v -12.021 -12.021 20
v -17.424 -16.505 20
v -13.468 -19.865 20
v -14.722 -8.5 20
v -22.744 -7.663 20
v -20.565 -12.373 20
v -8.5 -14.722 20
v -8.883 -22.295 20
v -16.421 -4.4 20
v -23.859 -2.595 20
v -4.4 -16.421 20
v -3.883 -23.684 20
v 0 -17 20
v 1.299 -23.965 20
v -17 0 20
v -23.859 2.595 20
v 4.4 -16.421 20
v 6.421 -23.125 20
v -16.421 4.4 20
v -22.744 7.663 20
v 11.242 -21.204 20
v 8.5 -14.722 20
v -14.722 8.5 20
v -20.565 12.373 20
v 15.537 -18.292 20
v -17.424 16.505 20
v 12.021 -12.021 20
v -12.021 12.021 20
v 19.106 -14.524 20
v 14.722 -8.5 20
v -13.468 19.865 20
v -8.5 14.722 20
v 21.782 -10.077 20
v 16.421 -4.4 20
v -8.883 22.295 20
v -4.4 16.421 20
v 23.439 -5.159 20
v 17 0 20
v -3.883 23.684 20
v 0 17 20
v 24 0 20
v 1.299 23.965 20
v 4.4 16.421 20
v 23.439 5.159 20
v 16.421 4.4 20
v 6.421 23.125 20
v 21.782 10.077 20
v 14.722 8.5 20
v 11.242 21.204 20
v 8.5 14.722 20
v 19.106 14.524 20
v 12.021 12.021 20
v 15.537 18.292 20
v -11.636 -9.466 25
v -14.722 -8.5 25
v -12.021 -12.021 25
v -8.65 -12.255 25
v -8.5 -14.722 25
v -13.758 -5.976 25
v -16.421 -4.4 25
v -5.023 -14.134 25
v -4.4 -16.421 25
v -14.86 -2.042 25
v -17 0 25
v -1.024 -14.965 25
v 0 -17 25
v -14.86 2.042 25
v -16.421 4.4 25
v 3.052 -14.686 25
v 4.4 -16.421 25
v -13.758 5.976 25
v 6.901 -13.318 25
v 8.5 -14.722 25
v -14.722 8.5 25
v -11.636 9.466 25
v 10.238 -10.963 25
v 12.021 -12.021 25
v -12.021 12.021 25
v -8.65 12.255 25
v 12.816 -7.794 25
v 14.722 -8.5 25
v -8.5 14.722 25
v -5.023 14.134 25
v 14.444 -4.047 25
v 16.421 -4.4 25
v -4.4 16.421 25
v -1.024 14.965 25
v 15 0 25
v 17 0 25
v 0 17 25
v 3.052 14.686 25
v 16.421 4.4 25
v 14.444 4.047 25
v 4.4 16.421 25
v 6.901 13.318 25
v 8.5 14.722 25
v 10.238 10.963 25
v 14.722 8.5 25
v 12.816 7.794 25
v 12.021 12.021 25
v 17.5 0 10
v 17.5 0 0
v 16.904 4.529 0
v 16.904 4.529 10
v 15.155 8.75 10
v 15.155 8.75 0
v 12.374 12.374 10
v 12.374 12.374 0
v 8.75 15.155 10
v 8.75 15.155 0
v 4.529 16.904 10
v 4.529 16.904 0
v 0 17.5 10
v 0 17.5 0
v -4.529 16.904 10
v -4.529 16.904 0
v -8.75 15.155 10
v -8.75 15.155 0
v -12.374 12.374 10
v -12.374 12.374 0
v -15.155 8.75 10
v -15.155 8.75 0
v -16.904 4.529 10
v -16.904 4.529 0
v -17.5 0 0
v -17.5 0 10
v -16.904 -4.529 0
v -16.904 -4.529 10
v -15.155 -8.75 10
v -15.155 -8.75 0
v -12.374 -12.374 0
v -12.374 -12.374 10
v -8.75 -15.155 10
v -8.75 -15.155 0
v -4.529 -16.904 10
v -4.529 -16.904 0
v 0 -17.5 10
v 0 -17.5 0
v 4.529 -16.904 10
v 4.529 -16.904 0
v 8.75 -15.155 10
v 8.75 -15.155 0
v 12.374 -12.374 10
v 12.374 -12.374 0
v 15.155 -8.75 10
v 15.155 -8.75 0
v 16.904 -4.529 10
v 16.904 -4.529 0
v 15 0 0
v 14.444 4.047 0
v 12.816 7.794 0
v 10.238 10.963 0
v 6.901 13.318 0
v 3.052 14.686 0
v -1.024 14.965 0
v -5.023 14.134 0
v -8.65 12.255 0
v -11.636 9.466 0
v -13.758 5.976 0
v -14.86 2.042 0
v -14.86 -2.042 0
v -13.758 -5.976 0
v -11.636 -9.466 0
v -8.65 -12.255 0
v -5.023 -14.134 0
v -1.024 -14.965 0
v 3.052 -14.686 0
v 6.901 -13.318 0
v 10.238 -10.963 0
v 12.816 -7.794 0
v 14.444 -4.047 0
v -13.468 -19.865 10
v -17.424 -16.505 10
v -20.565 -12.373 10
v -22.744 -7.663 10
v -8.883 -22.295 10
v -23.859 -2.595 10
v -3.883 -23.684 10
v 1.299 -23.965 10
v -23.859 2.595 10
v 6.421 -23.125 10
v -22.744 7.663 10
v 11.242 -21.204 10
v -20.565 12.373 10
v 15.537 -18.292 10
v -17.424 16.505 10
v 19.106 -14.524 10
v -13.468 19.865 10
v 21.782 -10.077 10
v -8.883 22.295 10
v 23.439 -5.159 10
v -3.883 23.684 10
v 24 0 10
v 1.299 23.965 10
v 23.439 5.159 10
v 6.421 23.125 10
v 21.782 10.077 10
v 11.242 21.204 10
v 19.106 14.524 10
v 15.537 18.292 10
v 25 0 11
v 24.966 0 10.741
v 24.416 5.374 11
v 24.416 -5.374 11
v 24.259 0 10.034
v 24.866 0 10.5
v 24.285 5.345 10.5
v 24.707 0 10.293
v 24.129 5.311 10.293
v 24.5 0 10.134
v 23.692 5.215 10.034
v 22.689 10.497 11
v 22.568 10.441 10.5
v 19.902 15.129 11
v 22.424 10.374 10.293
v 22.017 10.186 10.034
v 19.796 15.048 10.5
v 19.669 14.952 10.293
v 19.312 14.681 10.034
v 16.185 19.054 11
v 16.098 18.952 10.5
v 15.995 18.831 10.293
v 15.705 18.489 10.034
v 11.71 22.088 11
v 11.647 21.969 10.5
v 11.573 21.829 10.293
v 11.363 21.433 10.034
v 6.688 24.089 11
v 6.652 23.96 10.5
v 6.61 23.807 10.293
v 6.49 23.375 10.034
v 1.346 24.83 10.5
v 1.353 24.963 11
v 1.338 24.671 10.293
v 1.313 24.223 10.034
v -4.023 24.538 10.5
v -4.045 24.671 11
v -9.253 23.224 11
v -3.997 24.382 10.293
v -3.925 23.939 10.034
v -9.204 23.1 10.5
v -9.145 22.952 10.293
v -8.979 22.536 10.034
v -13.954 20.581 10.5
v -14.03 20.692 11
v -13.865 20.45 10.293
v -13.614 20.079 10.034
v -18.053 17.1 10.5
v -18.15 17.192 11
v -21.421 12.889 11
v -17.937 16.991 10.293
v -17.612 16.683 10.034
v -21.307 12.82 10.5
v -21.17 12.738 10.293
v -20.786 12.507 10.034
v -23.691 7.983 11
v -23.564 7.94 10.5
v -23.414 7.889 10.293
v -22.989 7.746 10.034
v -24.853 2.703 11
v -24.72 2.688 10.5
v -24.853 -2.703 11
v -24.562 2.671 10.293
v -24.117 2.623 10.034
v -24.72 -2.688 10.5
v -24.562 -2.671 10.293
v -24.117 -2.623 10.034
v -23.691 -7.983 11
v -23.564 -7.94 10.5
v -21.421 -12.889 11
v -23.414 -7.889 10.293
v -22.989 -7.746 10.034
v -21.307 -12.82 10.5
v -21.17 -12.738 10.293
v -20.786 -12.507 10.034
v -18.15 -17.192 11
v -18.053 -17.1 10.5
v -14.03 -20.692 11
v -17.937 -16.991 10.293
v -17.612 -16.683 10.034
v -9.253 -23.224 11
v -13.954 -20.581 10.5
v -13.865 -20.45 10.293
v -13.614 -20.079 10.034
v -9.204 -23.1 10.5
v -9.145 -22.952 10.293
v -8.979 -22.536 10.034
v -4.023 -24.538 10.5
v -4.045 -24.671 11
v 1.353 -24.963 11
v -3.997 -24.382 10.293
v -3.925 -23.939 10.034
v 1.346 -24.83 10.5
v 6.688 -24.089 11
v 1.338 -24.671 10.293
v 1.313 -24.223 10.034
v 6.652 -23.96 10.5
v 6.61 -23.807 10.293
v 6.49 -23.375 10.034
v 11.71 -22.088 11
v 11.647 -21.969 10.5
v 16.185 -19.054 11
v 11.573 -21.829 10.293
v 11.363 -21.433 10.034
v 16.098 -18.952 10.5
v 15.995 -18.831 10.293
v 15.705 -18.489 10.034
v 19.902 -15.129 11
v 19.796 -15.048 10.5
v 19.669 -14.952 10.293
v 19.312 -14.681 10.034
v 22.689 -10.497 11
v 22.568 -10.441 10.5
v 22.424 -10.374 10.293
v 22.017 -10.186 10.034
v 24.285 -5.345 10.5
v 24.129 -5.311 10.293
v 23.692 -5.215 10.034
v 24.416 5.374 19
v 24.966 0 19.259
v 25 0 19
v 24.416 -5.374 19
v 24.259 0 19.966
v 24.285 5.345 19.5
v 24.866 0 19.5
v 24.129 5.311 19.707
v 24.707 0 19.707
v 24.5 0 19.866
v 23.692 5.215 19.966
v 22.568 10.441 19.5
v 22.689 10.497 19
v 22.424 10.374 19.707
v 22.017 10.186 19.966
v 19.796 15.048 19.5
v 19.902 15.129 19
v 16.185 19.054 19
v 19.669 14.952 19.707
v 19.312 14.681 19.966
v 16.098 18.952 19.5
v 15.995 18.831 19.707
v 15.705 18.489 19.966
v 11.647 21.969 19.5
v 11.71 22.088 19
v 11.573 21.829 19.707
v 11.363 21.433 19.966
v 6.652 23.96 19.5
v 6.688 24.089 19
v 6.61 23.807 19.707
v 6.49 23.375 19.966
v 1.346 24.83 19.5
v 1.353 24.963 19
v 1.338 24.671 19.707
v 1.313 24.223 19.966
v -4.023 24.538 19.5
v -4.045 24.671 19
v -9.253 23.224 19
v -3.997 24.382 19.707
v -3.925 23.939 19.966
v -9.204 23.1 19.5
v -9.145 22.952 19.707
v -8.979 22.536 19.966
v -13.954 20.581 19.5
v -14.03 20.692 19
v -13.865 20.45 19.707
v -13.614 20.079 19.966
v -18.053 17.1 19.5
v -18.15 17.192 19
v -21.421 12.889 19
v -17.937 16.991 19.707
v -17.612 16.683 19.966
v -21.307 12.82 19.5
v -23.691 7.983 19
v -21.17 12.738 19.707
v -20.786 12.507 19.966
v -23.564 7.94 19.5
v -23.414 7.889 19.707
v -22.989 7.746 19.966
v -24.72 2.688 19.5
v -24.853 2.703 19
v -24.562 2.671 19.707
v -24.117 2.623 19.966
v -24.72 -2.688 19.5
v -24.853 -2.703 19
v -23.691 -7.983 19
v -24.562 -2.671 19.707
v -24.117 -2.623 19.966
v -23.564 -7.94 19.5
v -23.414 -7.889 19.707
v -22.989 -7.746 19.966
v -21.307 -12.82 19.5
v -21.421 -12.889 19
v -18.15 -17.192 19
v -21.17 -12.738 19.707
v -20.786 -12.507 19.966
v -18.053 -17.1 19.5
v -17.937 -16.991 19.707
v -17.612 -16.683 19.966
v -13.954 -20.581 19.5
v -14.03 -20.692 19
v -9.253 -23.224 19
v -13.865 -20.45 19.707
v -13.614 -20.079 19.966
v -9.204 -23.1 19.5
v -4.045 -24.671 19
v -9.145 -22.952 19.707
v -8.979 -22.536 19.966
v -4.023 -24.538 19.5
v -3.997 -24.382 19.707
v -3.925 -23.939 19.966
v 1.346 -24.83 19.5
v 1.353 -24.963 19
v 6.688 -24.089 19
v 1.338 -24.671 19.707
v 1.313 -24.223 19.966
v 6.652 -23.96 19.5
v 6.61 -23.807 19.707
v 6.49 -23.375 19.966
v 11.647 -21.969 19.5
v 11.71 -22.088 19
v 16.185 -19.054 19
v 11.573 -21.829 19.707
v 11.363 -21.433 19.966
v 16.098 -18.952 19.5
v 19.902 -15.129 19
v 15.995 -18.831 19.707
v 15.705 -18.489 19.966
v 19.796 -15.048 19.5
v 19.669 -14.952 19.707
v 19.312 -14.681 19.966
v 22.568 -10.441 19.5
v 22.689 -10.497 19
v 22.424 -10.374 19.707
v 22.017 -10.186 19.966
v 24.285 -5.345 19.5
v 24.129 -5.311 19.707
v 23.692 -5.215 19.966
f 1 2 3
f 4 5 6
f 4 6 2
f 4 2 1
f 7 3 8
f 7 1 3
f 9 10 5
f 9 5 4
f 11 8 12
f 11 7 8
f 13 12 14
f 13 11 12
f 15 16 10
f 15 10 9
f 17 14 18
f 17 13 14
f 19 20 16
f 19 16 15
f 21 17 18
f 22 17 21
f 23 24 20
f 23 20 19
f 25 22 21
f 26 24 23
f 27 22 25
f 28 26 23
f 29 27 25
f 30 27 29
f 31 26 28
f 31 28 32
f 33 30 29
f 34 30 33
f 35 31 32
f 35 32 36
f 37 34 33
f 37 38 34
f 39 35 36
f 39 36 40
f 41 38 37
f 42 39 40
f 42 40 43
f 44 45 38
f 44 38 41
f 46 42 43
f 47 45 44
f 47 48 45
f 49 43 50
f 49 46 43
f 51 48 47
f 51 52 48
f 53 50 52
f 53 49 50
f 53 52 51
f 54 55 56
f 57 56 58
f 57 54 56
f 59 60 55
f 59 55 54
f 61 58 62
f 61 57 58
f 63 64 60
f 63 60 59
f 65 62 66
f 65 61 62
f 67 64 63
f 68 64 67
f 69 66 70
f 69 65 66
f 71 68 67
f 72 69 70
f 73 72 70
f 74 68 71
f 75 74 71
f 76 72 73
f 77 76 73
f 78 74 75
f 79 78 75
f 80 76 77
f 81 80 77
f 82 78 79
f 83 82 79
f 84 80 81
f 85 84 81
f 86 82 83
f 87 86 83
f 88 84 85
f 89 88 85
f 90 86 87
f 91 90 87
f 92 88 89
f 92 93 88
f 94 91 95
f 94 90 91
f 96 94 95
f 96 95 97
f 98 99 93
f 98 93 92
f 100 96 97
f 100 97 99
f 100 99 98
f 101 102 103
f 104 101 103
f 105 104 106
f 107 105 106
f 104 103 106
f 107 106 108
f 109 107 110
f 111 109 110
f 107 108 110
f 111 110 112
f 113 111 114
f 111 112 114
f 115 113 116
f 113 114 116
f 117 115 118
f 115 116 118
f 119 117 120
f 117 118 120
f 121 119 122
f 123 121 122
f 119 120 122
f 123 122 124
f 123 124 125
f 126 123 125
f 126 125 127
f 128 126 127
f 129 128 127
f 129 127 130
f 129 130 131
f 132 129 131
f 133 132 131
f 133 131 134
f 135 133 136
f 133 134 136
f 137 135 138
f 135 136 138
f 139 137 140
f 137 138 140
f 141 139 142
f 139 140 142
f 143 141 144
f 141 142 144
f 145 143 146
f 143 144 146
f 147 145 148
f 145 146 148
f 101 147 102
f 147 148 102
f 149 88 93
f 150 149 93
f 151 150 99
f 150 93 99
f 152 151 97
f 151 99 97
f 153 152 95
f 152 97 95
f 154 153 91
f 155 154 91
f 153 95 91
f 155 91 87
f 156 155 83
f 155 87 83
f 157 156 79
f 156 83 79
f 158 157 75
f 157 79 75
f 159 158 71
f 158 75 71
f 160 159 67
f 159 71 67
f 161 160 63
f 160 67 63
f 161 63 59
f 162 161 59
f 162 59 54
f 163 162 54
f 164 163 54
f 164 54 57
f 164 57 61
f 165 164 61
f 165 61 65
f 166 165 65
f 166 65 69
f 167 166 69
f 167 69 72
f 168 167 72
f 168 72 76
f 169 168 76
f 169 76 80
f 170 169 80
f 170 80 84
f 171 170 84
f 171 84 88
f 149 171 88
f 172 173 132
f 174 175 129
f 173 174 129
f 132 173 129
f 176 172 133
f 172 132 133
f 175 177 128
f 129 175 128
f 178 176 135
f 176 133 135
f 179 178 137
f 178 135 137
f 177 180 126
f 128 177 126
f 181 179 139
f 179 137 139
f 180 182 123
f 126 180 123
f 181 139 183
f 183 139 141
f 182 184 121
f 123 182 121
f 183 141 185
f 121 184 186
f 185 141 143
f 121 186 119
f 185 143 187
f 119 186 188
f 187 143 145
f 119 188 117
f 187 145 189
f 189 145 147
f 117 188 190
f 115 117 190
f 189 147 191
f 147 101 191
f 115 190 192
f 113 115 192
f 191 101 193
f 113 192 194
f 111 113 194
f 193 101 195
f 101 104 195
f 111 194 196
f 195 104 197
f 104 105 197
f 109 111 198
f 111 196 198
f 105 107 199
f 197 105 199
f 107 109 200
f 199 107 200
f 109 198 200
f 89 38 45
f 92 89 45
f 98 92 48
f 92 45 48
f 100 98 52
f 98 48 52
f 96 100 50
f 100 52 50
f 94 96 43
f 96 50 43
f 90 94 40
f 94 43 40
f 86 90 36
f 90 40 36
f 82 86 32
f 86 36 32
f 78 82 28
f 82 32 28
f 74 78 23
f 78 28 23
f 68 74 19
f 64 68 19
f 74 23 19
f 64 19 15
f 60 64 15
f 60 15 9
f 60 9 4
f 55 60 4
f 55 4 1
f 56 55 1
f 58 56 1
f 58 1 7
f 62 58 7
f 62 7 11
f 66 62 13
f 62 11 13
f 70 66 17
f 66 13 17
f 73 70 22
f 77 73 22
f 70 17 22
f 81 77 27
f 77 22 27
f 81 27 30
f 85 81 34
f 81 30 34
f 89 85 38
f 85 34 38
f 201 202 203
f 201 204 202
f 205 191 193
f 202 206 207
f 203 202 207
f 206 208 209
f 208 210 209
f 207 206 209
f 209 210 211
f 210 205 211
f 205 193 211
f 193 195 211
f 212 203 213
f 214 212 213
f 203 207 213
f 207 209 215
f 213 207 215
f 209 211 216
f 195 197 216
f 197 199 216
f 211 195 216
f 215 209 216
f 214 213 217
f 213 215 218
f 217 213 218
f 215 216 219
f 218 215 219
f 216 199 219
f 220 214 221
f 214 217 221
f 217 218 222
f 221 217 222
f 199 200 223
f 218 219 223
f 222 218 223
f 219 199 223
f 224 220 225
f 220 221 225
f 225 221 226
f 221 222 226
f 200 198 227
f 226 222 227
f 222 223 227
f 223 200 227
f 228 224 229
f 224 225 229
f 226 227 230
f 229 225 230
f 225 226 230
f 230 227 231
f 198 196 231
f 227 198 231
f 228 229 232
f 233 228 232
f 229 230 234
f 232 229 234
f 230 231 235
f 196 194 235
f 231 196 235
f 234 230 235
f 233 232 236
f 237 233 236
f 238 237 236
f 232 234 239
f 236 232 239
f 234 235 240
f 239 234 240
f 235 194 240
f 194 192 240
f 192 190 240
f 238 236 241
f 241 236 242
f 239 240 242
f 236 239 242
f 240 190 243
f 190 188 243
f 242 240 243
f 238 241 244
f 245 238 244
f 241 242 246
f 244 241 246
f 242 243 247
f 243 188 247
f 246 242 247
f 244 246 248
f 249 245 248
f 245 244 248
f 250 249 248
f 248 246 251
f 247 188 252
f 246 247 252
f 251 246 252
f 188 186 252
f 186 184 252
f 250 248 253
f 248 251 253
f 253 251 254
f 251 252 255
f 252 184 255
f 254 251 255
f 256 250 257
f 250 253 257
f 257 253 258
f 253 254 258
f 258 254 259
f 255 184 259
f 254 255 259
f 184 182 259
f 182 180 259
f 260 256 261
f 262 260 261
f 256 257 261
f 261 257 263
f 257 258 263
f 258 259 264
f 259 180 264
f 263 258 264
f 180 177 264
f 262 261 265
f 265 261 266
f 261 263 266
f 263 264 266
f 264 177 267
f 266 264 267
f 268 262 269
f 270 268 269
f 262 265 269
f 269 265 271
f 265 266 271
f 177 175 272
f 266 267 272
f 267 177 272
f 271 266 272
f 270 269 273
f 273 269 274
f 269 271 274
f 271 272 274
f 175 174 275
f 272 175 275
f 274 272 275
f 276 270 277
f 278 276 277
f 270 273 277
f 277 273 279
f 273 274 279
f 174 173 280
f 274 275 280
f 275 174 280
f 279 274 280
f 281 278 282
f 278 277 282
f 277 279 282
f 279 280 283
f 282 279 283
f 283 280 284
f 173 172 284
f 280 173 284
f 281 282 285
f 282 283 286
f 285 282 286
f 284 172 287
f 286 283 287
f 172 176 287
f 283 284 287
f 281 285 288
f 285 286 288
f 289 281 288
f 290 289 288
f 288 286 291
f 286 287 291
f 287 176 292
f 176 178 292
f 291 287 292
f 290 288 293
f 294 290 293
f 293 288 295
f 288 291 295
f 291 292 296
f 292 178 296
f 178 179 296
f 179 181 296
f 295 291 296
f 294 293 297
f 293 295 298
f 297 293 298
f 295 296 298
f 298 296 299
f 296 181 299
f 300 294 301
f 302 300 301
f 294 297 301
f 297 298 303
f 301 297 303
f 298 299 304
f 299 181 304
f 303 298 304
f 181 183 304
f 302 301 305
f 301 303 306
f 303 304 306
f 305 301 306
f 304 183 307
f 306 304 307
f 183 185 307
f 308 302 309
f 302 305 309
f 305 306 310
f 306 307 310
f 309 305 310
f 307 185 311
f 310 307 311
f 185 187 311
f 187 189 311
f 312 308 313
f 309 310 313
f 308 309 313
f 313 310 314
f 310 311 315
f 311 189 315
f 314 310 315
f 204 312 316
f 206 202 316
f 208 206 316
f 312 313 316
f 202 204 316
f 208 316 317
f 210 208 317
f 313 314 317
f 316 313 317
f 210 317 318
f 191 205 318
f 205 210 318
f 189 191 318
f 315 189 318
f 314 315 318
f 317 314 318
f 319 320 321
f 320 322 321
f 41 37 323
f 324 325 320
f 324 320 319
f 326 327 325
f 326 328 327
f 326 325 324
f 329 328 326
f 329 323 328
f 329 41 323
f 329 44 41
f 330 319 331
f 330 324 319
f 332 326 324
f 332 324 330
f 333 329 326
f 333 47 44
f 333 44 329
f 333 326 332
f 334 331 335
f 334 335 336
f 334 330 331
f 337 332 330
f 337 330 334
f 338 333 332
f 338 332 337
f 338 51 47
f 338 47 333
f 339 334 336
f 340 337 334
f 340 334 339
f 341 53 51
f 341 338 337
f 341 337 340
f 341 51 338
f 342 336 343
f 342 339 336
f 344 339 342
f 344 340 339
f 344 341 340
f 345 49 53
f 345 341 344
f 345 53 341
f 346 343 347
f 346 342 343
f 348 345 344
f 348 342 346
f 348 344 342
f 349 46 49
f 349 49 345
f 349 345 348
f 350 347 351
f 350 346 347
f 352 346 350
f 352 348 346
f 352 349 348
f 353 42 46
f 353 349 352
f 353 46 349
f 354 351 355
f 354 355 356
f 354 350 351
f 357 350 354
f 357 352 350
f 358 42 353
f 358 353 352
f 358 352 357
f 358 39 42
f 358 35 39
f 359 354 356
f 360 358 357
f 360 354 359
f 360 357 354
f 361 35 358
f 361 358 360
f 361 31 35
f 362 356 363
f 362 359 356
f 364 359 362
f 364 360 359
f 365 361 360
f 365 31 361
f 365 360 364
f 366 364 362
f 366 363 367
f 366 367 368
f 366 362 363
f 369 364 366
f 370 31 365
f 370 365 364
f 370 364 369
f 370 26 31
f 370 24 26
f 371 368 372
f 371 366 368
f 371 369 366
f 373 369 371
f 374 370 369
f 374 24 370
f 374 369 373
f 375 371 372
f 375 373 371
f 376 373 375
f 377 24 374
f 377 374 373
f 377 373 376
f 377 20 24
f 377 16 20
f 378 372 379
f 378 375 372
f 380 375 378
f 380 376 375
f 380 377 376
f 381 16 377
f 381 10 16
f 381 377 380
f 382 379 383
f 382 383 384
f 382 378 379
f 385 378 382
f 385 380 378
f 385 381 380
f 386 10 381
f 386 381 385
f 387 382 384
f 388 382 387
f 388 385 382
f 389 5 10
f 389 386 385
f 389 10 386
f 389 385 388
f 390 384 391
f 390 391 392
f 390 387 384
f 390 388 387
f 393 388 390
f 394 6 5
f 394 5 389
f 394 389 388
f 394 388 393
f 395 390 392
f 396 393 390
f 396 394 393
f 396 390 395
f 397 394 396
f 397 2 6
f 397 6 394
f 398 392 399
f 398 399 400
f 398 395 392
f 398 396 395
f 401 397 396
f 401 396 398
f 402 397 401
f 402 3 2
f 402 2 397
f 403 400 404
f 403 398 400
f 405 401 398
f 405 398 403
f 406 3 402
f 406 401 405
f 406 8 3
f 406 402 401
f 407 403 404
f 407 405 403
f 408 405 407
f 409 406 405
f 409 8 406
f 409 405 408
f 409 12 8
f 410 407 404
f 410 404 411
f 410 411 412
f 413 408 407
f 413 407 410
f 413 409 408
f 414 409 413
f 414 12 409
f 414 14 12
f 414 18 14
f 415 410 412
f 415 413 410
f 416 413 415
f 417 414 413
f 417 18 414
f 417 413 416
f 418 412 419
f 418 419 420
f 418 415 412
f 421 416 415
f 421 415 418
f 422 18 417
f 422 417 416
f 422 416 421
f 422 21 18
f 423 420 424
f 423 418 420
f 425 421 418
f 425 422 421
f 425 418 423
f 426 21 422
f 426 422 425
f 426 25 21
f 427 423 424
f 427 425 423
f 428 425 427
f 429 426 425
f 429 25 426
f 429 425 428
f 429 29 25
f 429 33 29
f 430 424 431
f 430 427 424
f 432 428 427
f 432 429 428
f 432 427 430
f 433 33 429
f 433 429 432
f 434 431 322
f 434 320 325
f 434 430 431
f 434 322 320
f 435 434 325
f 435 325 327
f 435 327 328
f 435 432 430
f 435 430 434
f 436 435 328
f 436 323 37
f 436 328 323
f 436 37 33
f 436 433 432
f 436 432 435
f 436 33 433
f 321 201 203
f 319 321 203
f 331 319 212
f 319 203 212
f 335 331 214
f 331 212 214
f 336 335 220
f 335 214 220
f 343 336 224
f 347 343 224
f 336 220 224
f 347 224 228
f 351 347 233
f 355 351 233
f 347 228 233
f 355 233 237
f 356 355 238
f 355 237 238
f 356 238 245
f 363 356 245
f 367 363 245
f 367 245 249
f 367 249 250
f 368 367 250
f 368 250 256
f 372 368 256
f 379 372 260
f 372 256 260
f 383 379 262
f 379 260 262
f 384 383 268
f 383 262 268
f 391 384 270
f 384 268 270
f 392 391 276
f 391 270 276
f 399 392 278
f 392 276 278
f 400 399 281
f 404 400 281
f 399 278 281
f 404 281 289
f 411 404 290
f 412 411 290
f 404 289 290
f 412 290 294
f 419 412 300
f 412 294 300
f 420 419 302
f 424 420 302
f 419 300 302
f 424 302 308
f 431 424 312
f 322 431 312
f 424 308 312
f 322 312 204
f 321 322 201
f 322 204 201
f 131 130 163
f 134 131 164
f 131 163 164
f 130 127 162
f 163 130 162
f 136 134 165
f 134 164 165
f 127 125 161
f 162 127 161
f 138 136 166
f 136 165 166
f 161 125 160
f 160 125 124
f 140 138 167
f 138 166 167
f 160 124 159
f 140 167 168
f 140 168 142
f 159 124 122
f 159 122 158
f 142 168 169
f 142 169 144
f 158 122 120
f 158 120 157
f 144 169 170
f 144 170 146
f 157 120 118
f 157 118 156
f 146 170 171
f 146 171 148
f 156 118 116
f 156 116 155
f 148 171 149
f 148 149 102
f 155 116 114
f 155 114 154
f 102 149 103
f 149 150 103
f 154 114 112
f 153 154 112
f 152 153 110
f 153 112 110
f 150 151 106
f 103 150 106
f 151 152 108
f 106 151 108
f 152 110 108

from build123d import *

# Parameters (mm, degrees)
SKETCH1_R               = 17.5
BOSS_EXTRUDE1_DEPTH     = 10
SKETCH2_R               = 25
BOSS_EXTRUDE2_DEPTH     = 10
SKETCH3_R               = 17
BOSS_EXTRUDE3_DEPTH     = 5
SKETCH4_R               = 15
CUT_EXTRUDE1_DEPTH      = 1
CUT_EXTRUDE1_DEPTH_BACK = 26
FILLET1_R               = 1


with BuildPart() as part:
    # Sketch1 → Boss-Extrude1 (new body)
    with BuildSketch(Plane.XY):
        Circle(SKETCH1_R)
    extrude(amount=BOSS_EXTRUDE1_DEPTH)

    # Sketch2 → Boss-Extrude2 (add)
    with BuildSketch(Plane.XY.offset(10)):
        Circle(SKETCH2_R)
    extrude(amount=BOSS_EXTRUDE2_DEPTH)

    # Sketch3 → Boss-Extrude3 (add)
    with BuildSketch(Plane.XY.offset(20)):
        Circle(SKETCH3_R)
    extrude(amount=BOSS_EXTRUDE3_DEPTH)

    # Sketch4 → Cut-Extrude1 (cut, two sides)
    with BuildSketch(Plane.XY.offset(25)) as cut_extrude1_sk:
        Circle(SKETCH4_R)
    extrude(amount=CUT_EXTRUDE1_DEPTH, mode=Mode.SUBTRACT)
    extrude(cut_extrude1_sk.sketch, amount=-CUT_EXTRUDE1_DEPTH_BACK, mode=Mode.SUBTRACT)

    # Fillet1
    fillet1_edges = [part.edges().sort_by_distance(p)[0] for p in [
        (-25, 0, 10),
        (-25, 0, 20),
    ]]
    fillet(fillet1_edges, radius=FILLET1_R)


solid = part.part
